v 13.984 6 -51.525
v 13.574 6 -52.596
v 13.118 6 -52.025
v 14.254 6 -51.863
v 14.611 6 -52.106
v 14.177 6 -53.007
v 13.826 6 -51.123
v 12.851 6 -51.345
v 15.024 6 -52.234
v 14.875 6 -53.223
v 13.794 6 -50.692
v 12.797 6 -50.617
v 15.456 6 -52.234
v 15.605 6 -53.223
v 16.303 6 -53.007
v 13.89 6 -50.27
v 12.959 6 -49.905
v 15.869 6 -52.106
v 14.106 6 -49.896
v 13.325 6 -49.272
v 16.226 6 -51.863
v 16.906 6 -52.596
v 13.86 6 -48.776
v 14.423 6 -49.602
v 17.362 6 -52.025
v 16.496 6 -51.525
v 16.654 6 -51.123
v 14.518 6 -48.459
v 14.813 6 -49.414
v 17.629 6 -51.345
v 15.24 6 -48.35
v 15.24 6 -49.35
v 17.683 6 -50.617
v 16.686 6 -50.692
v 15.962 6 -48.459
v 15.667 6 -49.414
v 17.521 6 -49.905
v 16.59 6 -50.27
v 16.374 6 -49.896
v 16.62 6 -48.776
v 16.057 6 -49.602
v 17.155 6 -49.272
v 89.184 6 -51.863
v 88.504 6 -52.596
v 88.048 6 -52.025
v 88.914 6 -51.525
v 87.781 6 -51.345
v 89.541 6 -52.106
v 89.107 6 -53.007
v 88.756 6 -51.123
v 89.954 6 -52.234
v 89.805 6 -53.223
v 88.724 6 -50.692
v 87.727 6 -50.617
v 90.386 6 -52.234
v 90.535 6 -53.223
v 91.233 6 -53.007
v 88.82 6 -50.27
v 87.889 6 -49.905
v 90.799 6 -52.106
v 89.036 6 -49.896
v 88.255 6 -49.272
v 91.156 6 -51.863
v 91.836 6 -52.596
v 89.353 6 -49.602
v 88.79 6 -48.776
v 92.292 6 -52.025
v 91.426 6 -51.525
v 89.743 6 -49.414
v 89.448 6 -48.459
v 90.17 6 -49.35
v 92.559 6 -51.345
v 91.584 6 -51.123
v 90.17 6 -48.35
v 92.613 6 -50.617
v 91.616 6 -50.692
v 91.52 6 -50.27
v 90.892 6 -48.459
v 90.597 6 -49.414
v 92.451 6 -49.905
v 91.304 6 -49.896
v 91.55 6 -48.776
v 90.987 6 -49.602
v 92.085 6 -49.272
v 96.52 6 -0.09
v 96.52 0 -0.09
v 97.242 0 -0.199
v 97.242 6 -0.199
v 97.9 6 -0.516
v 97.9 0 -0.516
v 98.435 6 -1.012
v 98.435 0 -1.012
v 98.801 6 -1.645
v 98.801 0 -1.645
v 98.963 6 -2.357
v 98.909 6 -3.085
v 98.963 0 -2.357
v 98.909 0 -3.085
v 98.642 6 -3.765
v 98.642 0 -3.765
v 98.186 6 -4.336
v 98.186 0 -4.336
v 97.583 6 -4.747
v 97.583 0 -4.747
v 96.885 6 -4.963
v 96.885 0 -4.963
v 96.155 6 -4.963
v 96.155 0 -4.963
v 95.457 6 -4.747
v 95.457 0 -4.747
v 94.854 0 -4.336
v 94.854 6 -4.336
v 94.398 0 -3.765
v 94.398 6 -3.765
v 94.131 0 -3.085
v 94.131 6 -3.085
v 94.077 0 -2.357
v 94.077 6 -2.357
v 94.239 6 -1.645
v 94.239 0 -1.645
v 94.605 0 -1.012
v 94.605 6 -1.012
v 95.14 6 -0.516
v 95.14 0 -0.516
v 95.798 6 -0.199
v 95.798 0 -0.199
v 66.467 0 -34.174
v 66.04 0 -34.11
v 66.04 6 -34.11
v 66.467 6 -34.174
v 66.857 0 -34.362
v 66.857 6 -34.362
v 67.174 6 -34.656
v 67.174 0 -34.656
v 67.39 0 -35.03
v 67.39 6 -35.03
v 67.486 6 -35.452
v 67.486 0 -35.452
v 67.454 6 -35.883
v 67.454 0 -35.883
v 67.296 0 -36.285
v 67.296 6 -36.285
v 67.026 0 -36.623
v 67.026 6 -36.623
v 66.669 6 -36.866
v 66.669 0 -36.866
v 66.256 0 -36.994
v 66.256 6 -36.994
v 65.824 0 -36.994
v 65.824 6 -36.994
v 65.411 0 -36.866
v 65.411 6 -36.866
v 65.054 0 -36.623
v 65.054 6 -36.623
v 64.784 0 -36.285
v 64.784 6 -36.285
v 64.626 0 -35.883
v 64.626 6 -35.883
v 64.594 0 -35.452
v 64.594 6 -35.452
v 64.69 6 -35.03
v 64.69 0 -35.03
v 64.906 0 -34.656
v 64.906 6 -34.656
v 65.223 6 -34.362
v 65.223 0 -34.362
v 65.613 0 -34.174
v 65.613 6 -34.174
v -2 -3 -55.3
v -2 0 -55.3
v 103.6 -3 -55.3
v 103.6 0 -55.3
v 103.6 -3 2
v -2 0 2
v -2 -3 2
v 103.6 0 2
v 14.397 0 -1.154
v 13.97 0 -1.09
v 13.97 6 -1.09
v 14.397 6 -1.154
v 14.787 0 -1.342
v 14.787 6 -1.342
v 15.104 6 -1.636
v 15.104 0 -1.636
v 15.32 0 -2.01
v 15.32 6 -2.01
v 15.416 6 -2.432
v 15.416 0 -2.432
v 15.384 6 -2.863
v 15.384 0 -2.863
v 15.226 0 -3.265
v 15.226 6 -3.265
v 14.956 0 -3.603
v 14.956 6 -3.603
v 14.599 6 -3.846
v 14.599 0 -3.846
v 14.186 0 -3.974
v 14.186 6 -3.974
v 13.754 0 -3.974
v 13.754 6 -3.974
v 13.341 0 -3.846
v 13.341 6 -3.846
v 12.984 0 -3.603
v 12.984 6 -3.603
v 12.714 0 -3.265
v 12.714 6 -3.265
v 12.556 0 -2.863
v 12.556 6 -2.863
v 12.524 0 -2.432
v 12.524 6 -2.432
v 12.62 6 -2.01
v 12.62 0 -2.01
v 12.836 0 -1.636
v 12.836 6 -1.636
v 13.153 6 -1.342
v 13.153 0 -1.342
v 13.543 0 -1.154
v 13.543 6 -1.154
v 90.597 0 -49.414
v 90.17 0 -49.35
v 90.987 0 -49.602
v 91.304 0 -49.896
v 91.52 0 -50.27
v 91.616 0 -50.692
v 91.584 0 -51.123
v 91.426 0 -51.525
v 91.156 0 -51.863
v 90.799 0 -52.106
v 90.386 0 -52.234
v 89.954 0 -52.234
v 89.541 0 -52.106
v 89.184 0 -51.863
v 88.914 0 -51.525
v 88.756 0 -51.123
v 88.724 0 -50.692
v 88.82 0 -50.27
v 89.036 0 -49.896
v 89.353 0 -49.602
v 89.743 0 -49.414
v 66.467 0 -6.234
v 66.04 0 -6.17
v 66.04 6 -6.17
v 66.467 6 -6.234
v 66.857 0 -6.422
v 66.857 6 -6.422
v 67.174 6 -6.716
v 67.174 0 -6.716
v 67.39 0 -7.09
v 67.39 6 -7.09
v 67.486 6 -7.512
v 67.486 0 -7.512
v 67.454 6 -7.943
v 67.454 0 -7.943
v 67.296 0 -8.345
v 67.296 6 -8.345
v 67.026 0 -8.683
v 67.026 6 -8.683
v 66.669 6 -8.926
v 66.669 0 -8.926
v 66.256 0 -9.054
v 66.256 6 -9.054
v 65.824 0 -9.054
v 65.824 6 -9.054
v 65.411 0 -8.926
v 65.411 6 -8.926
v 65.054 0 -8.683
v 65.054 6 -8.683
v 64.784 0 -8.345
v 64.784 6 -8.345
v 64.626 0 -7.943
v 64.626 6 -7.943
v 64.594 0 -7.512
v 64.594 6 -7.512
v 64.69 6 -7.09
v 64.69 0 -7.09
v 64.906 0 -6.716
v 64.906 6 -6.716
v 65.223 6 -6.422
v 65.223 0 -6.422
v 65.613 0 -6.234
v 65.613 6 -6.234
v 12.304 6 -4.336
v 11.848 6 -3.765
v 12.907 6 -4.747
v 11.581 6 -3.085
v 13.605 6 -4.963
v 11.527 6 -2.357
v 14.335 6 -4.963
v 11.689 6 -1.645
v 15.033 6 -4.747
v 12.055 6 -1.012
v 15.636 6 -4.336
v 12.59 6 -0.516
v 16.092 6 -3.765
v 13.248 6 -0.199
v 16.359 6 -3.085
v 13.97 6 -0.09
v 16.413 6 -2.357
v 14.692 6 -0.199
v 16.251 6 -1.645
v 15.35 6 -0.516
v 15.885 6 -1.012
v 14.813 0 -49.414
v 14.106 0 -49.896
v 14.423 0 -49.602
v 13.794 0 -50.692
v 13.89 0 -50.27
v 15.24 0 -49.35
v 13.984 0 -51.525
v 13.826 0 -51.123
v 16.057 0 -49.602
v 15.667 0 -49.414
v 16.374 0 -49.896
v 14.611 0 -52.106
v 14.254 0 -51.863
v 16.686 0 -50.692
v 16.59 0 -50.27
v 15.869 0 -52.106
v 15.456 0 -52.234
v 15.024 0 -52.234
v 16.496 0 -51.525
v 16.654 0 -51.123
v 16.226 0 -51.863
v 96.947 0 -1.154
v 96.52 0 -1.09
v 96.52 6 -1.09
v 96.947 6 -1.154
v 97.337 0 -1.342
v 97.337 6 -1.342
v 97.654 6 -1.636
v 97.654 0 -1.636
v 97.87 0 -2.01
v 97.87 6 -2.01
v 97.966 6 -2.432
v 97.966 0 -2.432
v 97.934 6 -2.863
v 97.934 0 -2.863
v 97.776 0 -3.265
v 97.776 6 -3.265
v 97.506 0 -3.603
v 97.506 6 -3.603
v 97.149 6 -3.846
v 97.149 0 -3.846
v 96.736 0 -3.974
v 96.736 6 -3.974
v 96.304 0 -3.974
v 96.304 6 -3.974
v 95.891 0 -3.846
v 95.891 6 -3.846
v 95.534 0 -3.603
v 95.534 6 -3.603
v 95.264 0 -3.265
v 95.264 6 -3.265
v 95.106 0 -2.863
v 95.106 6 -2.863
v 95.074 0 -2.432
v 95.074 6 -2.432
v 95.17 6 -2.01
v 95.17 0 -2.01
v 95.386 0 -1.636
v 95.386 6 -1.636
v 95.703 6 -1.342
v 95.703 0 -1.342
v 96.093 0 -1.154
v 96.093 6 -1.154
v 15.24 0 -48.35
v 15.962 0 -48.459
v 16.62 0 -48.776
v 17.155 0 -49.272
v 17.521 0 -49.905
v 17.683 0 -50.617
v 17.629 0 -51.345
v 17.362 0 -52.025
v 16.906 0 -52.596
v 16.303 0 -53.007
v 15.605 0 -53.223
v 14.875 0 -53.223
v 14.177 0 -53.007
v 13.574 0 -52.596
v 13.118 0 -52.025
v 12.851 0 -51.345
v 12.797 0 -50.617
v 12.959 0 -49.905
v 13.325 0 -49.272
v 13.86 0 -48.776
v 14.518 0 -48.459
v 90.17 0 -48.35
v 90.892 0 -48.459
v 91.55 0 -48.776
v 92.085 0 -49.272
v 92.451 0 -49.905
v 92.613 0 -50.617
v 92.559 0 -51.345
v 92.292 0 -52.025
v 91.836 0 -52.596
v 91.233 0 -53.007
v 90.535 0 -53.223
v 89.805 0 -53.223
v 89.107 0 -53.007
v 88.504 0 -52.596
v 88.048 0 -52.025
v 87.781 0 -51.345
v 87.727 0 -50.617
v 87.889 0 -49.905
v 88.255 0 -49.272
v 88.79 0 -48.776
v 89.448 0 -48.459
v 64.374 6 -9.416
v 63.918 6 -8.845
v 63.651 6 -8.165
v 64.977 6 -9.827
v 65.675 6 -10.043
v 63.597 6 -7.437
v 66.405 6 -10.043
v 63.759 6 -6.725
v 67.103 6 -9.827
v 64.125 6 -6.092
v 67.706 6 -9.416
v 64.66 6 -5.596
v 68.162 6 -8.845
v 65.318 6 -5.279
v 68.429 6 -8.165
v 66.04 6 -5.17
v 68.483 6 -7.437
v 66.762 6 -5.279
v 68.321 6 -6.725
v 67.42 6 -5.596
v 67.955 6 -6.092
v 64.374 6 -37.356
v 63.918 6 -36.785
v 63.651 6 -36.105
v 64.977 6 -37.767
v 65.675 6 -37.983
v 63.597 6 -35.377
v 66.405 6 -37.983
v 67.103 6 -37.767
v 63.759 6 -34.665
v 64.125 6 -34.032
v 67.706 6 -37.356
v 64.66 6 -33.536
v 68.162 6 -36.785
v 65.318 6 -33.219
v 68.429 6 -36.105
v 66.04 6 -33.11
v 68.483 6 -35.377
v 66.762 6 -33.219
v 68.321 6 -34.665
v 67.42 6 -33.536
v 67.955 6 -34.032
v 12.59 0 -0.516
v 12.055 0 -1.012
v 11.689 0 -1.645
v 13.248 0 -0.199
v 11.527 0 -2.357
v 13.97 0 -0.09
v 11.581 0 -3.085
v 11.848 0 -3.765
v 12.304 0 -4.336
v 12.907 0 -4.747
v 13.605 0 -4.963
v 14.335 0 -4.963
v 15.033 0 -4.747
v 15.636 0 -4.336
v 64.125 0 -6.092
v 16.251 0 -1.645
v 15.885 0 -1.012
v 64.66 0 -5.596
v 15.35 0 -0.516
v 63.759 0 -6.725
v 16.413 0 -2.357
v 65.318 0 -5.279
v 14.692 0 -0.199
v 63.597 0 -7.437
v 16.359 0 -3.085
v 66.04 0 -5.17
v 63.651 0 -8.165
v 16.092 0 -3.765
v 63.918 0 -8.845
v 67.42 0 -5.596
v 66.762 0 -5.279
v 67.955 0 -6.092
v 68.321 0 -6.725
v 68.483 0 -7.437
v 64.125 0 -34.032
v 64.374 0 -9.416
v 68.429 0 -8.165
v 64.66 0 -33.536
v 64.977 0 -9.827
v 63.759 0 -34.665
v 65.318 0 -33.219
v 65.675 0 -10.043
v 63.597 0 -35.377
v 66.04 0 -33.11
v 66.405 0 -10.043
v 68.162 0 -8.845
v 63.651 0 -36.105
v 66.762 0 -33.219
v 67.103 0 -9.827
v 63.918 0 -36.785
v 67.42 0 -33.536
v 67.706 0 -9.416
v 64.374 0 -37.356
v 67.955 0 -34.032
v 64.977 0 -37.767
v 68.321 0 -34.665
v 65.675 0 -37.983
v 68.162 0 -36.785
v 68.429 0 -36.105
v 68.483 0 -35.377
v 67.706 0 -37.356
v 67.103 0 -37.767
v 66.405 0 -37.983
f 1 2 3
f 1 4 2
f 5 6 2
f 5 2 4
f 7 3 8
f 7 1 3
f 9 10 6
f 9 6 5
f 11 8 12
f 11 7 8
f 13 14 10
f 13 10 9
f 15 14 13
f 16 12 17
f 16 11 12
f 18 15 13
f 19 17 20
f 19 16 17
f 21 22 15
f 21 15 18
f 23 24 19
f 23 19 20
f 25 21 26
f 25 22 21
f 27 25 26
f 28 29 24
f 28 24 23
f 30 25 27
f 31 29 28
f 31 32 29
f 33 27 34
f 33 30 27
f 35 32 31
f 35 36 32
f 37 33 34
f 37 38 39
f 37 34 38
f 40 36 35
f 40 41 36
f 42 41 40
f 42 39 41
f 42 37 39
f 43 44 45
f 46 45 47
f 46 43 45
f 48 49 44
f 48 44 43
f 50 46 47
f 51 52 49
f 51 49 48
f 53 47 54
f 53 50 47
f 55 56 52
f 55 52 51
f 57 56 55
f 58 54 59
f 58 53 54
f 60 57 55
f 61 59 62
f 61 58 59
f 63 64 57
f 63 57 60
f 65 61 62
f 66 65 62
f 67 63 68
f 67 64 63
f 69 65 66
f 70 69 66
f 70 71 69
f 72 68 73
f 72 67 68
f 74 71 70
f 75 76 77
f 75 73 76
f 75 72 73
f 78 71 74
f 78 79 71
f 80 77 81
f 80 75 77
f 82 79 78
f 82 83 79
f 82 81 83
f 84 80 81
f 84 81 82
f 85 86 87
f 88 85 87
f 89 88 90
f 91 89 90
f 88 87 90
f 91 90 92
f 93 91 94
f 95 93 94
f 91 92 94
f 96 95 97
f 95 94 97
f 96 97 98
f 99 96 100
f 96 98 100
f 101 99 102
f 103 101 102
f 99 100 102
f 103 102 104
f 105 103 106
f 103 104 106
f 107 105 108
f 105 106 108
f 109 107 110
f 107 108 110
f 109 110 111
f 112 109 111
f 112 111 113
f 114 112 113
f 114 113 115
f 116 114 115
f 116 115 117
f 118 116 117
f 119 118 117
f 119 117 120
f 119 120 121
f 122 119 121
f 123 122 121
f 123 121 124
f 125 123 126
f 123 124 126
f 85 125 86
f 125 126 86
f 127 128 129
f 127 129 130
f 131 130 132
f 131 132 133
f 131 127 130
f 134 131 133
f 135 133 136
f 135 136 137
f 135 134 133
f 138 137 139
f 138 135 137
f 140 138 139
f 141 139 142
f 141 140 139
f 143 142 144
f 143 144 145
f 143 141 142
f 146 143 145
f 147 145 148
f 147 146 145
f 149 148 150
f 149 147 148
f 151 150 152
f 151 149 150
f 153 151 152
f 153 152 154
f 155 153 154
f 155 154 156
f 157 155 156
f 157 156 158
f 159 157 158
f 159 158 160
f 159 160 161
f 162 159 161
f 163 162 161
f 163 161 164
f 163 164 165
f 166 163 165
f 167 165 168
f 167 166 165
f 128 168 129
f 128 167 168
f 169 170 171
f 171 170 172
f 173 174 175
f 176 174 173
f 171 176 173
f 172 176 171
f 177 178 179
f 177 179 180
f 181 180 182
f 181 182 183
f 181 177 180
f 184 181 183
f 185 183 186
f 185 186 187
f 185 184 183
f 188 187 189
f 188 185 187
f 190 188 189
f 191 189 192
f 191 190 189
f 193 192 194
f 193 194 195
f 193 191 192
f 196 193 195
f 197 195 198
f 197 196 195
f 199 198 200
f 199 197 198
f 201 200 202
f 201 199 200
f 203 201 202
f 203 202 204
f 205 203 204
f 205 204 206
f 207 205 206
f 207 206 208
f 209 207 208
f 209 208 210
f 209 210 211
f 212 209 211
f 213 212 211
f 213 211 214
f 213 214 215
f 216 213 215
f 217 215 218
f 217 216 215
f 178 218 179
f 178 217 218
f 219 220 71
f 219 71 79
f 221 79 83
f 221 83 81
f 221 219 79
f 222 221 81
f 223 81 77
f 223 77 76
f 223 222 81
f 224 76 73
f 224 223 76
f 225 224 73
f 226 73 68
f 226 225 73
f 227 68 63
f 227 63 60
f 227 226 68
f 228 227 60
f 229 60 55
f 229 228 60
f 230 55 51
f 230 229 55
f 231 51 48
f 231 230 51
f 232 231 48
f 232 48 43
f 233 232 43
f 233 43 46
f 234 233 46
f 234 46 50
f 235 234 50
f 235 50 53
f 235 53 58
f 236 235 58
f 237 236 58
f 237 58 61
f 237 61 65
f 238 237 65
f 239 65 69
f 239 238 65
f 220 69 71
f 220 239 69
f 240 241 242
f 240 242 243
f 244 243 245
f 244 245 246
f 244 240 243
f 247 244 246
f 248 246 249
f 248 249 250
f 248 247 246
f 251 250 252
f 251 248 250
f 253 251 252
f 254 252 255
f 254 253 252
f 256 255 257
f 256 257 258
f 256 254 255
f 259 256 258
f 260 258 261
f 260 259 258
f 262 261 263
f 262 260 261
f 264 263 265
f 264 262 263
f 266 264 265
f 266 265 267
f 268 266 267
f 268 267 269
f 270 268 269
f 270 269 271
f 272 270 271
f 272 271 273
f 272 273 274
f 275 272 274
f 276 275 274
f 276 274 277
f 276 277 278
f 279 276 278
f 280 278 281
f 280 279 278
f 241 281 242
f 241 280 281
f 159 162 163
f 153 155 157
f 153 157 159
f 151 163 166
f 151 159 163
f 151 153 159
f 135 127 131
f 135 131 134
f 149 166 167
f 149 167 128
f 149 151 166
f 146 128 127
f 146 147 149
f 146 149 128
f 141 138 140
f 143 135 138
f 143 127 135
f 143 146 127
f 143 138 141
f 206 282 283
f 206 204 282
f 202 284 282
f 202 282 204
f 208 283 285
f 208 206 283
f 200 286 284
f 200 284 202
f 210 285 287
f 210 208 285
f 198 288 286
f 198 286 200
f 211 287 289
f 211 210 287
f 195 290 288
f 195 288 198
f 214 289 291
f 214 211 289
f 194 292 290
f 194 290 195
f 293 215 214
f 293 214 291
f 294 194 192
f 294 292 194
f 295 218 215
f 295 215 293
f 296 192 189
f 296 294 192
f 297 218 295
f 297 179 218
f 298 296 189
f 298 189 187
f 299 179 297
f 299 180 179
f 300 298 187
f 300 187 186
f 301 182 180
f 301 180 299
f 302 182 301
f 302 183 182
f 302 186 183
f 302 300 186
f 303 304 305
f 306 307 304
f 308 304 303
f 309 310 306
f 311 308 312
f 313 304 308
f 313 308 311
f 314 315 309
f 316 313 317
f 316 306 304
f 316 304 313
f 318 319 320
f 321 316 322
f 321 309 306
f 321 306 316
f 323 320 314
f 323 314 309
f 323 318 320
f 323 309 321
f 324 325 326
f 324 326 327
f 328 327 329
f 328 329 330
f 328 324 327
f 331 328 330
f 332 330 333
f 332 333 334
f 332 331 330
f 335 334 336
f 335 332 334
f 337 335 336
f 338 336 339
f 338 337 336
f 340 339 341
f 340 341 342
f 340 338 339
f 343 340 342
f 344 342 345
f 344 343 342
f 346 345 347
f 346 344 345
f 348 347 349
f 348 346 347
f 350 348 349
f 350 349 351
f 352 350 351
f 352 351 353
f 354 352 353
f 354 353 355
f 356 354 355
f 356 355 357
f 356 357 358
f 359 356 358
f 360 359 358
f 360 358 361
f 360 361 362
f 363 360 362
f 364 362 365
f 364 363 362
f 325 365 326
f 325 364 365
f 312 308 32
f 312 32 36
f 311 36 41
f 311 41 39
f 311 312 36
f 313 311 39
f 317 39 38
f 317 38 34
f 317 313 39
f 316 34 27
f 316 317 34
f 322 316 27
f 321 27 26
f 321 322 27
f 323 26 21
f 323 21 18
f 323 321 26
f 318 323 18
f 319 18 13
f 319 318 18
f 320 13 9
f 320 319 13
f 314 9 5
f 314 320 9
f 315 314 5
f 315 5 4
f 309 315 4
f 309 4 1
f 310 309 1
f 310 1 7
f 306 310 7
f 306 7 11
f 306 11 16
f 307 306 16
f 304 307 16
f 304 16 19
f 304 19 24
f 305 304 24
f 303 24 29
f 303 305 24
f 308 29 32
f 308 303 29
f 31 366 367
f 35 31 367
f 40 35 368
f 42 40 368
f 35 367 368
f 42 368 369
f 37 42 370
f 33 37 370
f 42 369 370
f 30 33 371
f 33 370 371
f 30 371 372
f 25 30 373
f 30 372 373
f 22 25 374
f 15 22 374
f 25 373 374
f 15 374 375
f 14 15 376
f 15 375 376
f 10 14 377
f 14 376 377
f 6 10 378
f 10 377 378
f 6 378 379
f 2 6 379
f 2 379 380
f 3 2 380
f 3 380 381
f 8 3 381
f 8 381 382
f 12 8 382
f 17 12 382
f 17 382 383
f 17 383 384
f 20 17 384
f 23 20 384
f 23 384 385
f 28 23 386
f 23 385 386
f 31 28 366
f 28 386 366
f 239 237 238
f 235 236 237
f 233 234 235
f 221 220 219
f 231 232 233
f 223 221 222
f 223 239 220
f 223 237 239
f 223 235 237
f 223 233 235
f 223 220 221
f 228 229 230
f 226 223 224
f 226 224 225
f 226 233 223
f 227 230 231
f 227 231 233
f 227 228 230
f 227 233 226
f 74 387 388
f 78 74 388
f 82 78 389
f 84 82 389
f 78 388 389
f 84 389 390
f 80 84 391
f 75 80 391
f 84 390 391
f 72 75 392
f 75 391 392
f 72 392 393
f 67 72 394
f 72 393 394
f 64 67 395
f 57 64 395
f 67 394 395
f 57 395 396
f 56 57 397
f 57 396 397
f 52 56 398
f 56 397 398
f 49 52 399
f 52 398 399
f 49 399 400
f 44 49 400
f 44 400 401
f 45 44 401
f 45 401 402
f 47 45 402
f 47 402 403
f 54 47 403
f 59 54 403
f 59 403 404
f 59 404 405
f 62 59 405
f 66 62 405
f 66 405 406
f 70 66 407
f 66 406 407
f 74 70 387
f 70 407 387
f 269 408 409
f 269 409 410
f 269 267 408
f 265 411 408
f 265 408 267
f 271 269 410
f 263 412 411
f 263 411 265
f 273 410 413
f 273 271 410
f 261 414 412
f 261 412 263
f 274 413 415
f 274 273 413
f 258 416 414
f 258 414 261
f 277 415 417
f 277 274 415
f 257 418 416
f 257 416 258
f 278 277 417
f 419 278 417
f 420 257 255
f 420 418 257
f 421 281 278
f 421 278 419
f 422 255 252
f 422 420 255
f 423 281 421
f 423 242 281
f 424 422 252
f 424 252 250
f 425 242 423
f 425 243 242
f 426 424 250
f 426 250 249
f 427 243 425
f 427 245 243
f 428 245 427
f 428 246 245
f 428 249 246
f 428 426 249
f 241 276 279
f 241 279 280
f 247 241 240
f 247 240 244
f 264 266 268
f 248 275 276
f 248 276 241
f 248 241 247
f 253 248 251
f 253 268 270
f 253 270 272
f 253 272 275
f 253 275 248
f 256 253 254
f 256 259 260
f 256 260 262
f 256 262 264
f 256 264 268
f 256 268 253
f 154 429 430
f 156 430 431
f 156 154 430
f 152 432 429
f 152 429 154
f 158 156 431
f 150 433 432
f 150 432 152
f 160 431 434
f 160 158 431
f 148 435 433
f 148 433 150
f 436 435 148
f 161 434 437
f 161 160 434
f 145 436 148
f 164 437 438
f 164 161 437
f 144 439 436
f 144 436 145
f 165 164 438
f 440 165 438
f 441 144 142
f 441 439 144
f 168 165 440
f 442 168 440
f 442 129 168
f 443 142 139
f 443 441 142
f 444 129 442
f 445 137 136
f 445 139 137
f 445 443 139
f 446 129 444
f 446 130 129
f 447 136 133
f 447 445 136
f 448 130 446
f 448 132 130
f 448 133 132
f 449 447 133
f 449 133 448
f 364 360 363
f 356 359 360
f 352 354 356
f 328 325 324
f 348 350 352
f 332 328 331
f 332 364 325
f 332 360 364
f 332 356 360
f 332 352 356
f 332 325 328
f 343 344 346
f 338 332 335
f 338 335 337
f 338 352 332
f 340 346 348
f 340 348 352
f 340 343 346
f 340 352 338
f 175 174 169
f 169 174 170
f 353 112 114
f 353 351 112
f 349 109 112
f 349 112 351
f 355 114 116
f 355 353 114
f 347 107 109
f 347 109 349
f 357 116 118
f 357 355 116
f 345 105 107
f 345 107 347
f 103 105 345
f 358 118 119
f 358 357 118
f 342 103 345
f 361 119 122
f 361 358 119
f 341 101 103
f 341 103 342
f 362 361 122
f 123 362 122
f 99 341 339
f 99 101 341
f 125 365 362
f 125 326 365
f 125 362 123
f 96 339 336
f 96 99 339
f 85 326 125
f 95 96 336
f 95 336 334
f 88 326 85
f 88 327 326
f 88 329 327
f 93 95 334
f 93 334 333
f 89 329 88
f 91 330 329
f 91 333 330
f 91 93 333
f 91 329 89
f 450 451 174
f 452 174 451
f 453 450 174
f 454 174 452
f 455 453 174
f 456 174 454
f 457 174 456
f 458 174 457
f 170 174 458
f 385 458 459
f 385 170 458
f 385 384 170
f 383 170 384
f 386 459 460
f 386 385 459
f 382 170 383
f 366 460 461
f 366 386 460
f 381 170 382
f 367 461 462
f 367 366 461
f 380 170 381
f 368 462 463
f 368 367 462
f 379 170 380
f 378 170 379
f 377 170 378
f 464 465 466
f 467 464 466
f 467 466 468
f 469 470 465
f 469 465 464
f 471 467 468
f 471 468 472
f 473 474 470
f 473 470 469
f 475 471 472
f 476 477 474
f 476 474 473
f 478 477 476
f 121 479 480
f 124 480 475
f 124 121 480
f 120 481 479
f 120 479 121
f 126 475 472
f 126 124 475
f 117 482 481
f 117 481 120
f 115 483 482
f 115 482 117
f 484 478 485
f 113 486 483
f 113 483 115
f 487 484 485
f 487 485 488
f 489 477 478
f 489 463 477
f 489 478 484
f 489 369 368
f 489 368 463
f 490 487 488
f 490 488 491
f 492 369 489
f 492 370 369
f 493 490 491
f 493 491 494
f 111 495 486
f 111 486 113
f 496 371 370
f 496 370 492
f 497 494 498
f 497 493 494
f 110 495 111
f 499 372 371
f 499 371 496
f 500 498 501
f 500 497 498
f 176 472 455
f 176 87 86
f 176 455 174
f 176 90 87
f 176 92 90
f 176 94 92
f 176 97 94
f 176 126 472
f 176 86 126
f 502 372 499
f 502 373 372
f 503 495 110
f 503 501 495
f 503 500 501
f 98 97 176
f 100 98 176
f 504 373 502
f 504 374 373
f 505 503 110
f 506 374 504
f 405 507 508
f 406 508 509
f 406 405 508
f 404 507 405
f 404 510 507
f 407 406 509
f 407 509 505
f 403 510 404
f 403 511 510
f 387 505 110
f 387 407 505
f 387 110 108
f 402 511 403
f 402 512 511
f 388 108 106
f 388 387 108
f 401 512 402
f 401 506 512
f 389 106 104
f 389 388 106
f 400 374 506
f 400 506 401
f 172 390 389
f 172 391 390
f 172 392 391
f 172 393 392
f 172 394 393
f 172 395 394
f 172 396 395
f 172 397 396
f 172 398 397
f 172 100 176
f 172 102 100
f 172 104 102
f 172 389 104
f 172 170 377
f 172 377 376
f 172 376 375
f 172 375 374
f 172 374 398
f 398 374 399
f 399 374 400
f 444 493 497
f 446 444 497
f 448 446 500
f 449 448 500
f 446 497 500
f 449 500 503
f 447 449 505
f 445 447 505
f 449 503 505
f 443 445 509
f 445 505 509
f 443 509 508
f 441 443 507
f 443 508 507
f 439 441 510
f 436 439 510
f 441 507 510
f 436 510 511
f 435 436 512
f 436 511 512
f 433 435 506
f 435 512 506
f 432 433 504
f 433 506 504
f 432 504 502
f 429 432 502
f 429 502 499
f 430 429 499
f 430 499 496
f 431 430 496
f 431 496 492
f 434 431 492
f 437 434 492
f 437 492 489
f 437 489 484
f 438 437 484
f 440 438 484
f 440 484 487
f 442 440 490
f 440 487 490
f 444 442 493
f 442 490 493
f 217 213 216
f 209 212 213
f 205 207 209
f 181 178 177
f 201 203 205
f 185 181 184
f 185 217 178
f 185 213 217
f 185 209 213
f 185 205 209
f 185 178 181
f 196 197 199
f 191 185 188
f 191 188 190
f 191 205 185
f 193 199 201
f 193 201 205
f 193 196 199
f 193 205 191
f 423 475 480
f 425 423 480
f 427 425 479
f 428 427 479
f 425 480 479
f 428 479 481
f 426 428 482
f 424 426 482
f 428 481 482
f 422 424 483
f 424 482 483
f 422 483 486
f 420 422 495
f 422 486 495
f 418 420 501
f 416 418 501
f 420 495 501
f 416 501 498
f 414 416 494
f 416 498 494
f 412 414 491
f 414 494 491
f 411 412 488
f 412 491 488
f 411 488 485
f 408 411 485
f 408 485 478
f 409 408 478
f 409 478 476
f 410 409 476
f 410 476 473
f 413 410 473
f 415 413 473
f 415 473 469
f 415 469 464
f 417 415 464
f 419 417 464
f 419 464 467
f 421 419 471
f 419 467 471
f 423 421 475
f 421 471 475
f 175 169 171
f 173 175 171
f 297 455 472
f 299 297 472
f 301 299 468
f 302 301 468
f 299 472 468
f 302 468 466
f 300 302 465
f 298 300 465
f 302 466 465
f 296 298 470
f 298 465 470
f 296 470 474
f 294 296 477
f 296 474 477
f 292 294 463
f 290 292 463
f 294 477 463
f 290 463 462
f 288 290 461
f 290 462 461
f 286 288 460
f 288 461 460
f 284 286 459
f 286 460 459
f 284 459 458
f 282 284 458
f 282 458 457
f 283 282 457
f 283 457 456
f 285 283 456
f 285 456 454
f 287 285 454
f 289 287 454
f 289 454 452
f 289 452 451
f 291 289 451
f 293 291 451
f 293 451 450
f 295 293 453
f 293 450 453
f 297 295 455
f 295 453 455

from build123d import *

# Parameters (mm, degrees)
SKETCH1_W           = 105.6
SKETCH1_H           = 57.3
BOSS_EXTRUDE1_DEPTH = 3
SKETCH1_4_R         = 2.45
SKETCH1_4_R_2       = 1.45
BOSS_EXTRUDE2_DEPTH = 6


with BuildPart() as part:
    # Sketch1 → Boss-Extrude1 (new body)
    with BuildSketch(Plane(origin=(0, 0, 0), x_dir=(1, 0, 0), z_dir=(0, 1, 0))):
        with Locations((50.8, 26.65)):
            Rectangle(SKETCH1_W, SKETCH1_H)
    extrude(amount=-BOSS_EXTRUDE1_DEPTH)

    # Sketch1_4 → Boss-Extrude2 (add)
    with BuildSketch(Plane(origin=(0, 0, 0), x_dir=(1, 0, 0), z_dir=(0, 1, 0))):
        with Locations(Location((13.97, 2.54, 0), (0, 0, 270))):  # turned: the seam where the file's is
            Circle(SKETCH1_4_R)
        with Locations(Location((13.97, 2.54, 0), (0, 0, 270))):  # turned: the seam where the file's is
            Circle(SKETCH1_4_R_2, mode=Mode.SUBTRACT)
        with Locations(Location((15.24, 50.8, 0), (0, 0, 270))):  # turned: the seam where the file's is
            Circle(SKETCH1_4_R)
        with Locations(Location((15.24, 50.8, 0), (0, 0, 270))):  # turned: the seam where the file's is
            Circle(SKETCH1_4_R_2, mode=Mode.SUBTRACT)
        with Locations(Location((66.04, 35.56, 0), (0, 0, 270))):  # turned: the seam where the file's is
            Circle(SKETCH1_4_R)
        with Locations(Location((66.04, 35.56, 0), (0, 0, 270))):  # turned: the seam where the file's is
            Circle(SKETCH1_4_R_2, mode=Mode.SUBTRACT)
        with Locations(Location((66.04, 7.62, 0), (0, 0, 270))):  # turned: the seam where the file's is
            Circle(SKETCH1_4_R)
        with Locations(Location((66.04, 7.62, 0), (0, 0, 270))):  # turned: the seam where the file's is
            Circle(SKETCH1_4_R_2, mode=Mode.SUBTRACT)
        with Locations(Location((96.52, 2.54, 0), (0, 0, 270))):  # turned: the seam where the file's is
            Circle(SKETCH1_4_R)
        with Locations(Location((96.52, 2.54, 0), (0, 0, 270))):  # turned: the seam where the file's is
            Circle(SKETCH1_4_R_2, mode=Mode.SUBTRACT)
        with Locations(Location((90.17, 50.8, 0), (0, 0, 270))):  # turned: the seam where the file's is
            Circle(SKETCH1_4_R)
        with Locations(Location((90.17, 50.8, 0), (0, 0, 270))):  # turned: the seam where the file's is
            Circle(SKETCH1_4_R_2, mode=Mode.SUBTRACT)
    extrude(amount=BOSS_EXTRUDE2_DEPTH)


solid = part.part
